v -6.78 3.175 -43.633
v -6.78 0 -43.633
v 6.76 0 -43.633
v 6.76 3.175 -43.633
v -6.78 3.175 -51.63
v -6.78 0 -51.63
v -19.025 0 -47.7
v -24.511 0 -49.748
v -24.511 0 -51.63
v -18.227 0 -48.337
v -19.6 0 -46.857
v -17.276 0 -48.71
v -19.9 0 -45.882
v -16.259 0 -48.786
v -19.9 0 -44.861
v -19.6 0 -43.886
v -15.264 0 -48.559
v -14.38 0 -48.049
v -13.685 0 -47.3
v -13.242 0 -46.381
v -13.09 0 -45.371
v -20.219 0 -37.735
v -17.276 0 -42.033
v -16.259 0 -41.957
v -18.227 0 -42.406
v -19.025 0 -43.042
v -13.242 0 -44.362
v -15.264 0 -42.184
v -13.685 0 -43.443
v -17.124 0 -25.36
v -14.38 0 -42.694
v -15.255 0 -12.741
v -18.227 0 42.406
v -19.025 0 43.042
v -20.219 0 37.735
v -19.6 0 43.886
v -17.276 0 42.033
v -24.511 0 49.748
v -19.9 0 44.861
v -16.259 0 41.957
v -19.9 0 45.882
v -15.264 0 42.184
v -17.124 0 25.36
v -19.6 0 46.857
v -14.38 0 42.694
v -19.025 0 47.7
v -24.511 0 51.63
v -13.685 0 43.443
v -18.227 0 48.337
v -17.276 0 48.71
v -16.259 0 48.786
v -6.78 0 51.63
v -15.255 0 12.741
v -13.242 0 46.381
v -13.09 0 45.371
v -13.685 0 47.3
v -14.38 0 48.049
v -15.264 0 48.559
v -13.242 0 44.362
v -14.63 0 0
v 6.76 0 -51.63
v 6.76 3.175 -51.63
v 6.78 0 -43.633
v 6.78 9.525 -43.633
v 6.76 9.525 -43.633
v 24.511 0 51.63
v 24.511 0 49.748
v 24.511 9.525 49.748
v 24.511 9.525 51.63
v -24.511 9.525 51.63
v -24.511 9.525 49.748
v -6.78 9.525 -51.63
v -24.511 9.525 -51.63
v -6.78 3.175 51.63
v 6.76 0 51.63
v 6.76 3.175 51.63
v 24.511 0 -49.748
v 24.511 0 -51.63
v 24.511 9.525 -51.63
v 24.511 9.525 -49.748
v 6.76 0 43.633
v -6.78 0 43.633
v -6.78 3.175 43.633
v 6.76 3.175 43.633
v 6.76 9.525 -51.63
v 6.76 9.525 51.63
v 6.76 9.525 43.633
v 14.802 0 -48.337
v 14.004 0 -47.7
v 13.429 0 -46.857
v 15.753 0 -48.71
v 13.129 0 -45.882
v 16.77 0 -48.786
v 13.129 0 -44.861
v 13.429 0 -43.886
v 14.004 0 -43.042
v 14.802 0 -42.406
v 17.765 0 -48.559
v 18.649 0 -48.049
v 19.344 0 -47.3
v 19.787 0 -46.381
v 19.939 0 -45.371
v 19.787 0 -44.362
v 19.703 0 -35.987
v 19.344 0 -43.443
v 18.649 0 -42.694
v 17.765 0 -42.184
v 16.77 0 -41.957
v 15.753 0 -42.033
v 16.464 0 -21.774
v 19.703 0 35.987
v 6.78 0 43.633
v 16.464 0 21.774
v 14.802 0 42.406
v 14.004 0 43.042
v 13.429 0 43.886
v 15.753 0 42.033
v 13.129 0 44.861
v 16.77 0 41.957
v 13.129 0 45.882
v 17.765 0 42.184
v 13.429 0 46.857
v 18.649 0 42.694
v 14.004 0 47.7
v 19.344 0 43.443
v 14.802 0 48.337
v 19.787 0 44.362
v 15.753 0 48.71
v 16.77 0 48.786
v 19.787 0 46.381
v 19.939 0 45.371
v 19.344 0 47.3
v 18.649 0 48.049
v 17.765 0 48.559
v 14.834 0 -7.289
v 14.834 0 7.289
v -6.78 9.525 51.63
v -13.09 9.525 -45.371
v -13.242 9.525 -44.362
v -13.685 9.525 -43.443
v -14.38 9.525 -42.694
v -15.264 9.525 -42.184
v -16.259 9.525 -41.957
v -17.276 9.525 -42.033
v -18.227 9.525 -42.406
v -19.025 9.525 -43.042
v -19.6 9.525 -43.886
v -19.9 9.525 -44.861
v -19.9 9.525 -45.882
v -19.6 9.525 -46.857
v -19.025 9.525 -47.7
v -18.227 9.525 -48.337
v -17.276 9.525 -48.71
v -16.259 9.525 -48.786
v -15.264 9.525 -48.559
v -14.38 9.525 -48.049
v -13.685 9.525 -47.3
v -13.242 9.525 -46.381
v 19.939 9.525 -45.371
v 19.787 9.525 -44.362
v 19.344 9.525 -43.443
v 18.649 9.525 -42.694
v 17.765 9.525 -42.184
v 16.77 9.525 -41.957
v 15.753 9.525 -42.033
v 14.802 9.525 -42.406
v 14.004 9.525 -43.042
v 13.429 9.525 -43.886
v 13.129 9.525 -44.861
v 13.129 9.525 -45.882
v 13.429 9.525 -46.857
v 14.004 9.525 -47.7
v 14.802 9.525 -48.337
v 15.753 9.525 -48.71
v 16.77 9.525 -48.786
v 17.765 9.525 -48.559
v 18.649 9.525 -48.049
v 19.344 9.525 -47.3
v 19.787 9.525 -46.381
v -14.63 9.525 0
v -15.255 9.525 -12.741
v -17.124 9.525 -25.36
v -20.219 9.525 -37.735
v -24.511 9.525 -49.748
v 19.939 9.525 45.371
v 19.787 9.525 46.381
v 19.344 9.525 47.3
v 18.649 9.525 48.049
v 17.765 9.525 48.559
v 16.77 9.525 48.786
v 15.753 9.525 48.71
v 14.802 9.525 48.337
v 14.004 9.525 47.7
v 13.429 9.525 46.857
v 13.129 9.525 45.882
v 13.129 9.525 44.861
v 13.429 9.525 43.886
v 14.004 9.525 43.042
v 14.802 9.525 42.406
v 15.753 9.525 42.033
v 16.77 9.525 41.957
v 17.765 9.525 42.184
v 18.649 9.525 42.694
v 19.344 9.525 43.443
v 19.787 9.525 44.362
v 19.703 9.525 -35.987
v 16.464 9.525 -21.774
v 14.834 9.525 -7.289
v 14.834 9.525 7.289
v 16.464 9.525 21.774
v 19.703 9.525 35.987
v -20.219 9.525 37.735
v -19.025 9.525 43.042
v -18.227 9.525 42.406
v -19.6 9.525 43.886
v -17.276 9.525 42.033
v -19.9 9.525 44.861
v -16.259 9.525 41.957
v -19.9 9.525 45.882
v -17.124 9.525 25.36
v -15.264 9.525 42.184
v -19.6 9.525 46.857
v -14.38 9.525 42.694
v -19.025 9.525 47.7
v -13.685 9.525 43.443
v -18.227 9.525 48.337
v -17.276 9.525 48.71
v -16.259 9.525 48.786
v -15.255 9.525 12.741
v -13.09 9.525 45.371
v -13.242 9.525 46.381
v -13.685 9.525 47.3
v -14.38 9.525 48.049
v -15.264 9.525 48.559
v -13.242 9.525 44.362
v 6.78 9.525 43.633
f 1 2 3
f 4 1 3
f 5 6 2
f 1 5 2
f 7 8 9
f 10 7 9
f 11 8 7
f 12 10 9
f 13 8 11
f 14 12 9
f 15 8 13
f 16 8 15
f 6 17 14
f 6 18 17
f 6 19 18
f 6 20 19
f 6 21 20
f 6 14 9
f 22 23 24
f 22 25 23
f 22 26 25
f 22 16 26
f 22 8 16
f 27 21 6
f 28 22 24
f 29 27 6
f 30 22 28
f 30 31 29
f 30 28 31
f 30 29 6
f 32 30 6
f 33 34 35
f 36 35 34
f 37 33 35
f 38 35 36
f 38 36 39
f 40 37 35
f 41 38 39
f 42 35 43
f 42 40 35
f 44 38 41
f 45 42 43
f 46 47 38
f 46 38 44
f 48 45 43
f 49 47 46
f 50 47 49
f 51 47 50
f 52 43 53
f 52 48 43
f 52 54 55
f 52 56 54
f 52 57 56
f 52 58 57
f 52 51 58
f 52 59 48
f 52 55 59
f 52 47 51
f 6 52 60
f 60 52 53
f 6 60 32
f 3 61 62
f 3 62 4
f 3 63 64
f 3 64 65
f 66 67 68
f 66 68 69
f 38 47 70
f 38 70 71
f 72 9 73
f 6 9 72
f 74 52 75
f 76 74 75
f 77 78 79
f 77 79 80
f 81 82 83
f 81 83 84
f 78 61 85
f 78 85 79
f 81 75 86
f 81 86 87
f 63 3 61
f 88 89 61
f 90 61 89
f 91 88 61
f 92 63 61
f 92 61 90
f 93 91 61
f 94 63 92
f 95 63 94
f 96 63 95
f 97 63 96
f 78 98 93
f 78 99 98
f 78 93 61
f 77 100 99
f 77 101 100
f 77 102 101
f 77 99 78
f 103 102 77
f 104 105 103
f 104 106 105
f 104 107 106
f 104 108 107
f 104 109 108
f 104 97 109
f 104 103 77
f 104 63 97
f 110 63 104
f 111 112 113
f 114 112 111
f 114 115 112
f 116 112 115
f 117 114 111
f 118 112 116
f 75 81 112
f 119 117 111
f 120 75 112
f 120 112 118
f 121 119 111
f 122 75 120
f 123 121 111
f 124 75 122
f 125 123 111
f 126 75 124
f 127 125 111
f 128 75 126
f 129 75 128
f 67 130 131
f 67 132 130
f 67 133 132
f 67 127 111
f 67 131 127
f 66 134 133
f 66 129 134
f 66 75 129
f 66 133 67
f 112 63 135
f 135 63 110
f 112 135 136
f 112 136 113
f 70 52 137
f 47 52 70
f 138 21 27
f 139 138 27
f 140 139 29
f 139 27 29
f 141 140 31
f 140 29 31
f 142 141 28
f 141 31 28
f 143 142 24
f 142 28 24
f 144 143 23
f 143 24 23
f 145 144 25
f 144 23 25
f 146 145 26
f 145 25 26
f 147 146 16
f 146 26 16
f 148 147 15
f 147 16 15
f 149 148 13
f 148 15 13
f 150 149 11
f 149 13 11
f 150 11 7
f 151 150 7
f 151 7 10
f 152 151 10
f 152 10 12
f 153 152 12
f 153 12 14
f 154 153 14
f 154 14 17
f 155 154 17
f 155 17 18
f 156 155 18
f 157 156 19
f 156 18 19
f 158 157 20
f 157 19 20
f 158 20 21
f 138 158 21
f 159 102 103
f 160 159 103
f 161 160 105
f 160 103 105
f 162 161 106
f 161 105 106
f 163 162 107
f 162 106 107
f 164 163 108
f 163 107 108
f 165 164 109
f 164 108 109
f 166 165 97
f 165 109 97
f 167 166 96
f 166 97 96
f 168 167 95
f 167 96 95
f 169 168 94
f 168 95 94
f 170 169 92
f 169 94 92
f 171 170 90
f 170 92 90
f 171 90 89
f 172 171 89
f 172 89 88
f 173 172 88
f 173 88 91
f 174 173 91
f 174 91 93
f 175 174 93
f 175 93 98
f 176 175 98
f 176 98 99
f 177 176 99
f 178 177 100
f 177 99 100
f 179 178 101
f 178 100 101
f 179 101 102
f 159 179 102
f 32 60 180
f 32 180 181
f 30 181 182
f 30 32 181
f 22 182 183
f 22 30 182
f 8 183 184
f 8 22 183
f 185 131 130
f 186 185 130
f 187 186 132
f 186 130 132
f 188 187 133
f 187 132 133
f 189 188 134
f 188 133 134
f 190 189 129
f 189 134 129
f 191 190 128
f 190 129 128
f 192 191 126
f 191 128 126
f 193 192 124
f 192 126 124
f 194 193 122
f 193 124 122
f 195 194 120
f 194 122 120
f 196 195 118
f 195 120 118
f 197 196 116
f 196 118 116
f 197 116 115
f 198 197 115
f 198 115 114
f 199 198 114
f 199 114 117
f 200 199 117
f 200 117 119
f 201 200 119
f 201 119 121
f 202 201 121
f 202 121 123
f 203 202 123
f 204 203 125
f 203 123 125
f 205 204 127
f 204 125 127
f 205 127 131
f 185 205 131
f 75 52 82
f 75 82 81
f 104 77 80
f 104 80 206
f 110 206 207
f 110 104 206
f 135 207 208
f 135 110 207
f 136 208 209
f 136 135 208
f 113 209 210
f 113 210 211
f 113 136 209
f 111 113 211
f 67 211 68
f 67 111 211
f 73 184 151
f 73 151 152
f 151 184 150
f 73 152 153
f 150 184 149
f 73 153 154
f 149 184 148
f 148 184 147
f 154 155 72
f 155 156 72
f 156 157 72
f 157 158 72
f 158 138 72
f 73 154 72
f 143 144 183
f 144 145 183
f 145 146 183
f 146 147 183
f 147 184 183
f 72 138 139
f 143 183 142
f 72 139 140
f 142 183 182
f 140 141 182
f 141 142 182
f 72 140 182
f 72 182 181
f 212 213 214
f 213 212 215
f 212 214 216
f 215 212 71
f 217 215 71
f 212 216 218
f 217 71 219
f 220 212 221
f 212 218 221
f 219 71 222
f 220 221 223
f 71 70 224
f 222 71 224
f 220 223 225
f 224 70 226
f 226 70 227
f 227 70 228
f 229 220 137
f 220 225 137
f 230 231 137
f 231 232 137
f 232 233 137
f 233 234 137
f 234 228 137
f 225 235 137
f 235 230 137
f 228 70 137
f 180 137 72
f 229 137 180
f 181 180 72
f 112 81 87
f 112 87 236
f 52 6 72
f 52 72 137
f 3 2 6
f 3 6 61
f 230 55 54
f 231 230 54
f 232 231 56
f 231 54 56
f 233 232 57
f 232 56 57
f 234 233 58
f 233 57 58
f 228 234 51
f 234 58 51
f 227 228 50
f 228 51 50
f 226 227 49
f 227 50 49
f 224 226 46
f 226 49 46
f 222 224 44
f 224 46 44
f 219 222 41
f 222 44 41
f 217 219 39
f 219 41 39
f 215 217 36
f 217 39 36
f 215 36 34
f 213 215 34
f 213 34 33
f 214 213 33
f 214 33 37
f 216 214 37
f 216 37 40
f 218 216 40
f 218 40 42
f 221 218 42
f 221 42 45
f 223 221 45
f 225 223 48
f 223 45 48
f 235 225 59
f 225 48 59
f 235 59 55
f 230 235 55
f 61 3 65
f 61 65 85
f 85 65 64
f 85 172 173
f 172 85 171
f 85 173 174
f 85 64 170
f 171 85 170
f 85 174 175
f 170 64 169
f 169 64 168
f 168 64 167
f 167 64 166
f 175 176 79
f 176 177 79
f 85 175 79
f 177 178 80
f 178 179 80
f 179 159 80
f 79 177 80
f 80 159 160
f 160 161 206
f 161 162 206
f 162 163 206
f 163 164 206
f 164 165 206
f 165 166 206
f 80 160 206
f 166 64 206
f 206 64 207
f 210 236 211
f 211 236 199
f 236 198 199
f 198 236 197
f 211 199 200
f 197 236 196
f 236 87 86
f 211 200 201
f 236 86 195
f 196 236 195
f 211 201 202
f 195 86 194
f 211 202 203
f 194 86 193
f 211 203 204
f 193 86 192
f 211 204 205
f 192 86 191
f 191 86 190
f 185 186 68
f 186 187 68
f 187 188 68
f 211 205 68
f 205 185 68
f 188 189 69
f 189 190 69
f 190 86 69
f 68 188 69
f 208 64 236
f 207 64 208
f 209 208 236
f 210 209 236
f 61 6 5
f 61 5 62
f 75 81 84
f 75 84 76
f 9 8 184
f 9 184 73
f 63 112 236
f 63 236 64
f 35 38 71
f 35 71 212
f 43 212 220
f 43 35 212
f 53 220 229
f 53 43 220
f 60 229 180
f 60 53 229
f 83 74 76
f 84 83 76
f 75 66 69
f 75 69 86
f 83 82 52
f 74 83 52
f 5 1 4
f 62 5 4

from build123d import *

# Parameters (mm, degrees)
F0_R     = 3.4241876024
F1_DEPTH = 9.525
F0_W     = 13.5395024959
F0_H     = 7.9965023652
F2_DEPTH = 3.175


with BuildPart() as f1:
    # F0 (on Front) → F1 (new body)
    with BuildSketch(Plane.XZ):
        with BuildLine():
            Line((-24.511, -51.6295505173), (-6.7796365268, -51.6295505173))
            Line((-6.7796365268, -51.6295505173), (-6.7796365268, -43.6330481522))
            Line((-6.7796365268, -43.6330481522), (-6.7796365268, 43.6330481522))
            Line((-6.7796365268, 43.6330481522), (-6.7796365268, 51.6295505173))
            Line((-6.7796365268, 51.6295505173), (-24.511, 51.6295505173))
            Line((-24.511, 51.6295505173), (-24.511, 49.748035513))
            ThreePointArc((-24.511, 49.748035513), (-17.1242555766, 25.3599005783), (-14.6301502406, 0))
            ThreePointArc((-14.6301502406, 0), (-17.1242555766, -25.3599005783), (-24.511, -49.748035513))
            Line((-24.511, -49.748035513), (-24.511, -51.6295505173))
        make_face()
        with Locations((-16.5145020448, -45.3714283937)):
            Circle(F0_R, mode=Mode.SUBTRACT)
        with Locations((-16.5145020448, 45.3714283937)):
            Circle(F0_R, mode=Mode.SUBTRACT)
    extrude(amount=-F1_DEPTH)


with BuildPart() as f1b:
    # F0 (on Front) → F1, piece 2 (new body)
    with BuildSketch(Plane.XZ):
        with BuildLine():
            Line((6.7598659691, -51.6295505173), (24.511, -51.6295505173))
            Line((24.511, -51.6295505173), (24.511, -49.748035513))
            ThreePointArc((24.511, -49.748035513), (14.6301502406, 0), (24.511, 49.748035513))
            Line((24.511, 49.748035513), (24.511, 51.6295505173))
            Line((24.511, 51.6295505173), (6.7598659691, 51.6295505173))
            Line((6.7598659691, 51.6295505173), (6.7598659691, 43.6330481522))
            Line((6.7598659691, 43.6330481522), (6.7796365268, 43.6330481522))
            Line((6.7796365268, 43.6330481522), (6.7796365268, -43.6330481522))
            Line((6.7796365268, -43.6330481522), (6.7598659691, -43.6330481522))
            Line((6.7598659691, -43.6330481522), (6.7598659691, -51.6295505173))
        make_face()
        with Locations((16.5145020448, -45.3714283937)):
            Circle(F0_R, mode=Mode.SUBTRACT)
        with Locations((16.5145020448, 45.3714283937)):
            Circle(F0_R, mode=Mode.SUBTRACT)
    extrude(amount=-F1_DEPTH)


with BuildPart() as f2:
    # F0 (on Front) → F2 (new body)
    with BuildSketch(Plane.XZ):
        with Locations((-0.0098852789, -47.6312993348)):
            Rectangle(F0_W, F0_H)
    extrude(amount=-F2_DEPTH)


with BuildPart() as f2b:
    # F0 (on Front) → F2, piece 2 (new body)
    with BuildSketch(Plane.XZ):
        with Locations((-0.0098852789, 47.6312993348)):
            Rectangle(F0_W, F0_H)
    extrude(amount=-F2_DEPTH)


solid = Compound([f1.part, f1b.part, f2.part, f2b.part])
